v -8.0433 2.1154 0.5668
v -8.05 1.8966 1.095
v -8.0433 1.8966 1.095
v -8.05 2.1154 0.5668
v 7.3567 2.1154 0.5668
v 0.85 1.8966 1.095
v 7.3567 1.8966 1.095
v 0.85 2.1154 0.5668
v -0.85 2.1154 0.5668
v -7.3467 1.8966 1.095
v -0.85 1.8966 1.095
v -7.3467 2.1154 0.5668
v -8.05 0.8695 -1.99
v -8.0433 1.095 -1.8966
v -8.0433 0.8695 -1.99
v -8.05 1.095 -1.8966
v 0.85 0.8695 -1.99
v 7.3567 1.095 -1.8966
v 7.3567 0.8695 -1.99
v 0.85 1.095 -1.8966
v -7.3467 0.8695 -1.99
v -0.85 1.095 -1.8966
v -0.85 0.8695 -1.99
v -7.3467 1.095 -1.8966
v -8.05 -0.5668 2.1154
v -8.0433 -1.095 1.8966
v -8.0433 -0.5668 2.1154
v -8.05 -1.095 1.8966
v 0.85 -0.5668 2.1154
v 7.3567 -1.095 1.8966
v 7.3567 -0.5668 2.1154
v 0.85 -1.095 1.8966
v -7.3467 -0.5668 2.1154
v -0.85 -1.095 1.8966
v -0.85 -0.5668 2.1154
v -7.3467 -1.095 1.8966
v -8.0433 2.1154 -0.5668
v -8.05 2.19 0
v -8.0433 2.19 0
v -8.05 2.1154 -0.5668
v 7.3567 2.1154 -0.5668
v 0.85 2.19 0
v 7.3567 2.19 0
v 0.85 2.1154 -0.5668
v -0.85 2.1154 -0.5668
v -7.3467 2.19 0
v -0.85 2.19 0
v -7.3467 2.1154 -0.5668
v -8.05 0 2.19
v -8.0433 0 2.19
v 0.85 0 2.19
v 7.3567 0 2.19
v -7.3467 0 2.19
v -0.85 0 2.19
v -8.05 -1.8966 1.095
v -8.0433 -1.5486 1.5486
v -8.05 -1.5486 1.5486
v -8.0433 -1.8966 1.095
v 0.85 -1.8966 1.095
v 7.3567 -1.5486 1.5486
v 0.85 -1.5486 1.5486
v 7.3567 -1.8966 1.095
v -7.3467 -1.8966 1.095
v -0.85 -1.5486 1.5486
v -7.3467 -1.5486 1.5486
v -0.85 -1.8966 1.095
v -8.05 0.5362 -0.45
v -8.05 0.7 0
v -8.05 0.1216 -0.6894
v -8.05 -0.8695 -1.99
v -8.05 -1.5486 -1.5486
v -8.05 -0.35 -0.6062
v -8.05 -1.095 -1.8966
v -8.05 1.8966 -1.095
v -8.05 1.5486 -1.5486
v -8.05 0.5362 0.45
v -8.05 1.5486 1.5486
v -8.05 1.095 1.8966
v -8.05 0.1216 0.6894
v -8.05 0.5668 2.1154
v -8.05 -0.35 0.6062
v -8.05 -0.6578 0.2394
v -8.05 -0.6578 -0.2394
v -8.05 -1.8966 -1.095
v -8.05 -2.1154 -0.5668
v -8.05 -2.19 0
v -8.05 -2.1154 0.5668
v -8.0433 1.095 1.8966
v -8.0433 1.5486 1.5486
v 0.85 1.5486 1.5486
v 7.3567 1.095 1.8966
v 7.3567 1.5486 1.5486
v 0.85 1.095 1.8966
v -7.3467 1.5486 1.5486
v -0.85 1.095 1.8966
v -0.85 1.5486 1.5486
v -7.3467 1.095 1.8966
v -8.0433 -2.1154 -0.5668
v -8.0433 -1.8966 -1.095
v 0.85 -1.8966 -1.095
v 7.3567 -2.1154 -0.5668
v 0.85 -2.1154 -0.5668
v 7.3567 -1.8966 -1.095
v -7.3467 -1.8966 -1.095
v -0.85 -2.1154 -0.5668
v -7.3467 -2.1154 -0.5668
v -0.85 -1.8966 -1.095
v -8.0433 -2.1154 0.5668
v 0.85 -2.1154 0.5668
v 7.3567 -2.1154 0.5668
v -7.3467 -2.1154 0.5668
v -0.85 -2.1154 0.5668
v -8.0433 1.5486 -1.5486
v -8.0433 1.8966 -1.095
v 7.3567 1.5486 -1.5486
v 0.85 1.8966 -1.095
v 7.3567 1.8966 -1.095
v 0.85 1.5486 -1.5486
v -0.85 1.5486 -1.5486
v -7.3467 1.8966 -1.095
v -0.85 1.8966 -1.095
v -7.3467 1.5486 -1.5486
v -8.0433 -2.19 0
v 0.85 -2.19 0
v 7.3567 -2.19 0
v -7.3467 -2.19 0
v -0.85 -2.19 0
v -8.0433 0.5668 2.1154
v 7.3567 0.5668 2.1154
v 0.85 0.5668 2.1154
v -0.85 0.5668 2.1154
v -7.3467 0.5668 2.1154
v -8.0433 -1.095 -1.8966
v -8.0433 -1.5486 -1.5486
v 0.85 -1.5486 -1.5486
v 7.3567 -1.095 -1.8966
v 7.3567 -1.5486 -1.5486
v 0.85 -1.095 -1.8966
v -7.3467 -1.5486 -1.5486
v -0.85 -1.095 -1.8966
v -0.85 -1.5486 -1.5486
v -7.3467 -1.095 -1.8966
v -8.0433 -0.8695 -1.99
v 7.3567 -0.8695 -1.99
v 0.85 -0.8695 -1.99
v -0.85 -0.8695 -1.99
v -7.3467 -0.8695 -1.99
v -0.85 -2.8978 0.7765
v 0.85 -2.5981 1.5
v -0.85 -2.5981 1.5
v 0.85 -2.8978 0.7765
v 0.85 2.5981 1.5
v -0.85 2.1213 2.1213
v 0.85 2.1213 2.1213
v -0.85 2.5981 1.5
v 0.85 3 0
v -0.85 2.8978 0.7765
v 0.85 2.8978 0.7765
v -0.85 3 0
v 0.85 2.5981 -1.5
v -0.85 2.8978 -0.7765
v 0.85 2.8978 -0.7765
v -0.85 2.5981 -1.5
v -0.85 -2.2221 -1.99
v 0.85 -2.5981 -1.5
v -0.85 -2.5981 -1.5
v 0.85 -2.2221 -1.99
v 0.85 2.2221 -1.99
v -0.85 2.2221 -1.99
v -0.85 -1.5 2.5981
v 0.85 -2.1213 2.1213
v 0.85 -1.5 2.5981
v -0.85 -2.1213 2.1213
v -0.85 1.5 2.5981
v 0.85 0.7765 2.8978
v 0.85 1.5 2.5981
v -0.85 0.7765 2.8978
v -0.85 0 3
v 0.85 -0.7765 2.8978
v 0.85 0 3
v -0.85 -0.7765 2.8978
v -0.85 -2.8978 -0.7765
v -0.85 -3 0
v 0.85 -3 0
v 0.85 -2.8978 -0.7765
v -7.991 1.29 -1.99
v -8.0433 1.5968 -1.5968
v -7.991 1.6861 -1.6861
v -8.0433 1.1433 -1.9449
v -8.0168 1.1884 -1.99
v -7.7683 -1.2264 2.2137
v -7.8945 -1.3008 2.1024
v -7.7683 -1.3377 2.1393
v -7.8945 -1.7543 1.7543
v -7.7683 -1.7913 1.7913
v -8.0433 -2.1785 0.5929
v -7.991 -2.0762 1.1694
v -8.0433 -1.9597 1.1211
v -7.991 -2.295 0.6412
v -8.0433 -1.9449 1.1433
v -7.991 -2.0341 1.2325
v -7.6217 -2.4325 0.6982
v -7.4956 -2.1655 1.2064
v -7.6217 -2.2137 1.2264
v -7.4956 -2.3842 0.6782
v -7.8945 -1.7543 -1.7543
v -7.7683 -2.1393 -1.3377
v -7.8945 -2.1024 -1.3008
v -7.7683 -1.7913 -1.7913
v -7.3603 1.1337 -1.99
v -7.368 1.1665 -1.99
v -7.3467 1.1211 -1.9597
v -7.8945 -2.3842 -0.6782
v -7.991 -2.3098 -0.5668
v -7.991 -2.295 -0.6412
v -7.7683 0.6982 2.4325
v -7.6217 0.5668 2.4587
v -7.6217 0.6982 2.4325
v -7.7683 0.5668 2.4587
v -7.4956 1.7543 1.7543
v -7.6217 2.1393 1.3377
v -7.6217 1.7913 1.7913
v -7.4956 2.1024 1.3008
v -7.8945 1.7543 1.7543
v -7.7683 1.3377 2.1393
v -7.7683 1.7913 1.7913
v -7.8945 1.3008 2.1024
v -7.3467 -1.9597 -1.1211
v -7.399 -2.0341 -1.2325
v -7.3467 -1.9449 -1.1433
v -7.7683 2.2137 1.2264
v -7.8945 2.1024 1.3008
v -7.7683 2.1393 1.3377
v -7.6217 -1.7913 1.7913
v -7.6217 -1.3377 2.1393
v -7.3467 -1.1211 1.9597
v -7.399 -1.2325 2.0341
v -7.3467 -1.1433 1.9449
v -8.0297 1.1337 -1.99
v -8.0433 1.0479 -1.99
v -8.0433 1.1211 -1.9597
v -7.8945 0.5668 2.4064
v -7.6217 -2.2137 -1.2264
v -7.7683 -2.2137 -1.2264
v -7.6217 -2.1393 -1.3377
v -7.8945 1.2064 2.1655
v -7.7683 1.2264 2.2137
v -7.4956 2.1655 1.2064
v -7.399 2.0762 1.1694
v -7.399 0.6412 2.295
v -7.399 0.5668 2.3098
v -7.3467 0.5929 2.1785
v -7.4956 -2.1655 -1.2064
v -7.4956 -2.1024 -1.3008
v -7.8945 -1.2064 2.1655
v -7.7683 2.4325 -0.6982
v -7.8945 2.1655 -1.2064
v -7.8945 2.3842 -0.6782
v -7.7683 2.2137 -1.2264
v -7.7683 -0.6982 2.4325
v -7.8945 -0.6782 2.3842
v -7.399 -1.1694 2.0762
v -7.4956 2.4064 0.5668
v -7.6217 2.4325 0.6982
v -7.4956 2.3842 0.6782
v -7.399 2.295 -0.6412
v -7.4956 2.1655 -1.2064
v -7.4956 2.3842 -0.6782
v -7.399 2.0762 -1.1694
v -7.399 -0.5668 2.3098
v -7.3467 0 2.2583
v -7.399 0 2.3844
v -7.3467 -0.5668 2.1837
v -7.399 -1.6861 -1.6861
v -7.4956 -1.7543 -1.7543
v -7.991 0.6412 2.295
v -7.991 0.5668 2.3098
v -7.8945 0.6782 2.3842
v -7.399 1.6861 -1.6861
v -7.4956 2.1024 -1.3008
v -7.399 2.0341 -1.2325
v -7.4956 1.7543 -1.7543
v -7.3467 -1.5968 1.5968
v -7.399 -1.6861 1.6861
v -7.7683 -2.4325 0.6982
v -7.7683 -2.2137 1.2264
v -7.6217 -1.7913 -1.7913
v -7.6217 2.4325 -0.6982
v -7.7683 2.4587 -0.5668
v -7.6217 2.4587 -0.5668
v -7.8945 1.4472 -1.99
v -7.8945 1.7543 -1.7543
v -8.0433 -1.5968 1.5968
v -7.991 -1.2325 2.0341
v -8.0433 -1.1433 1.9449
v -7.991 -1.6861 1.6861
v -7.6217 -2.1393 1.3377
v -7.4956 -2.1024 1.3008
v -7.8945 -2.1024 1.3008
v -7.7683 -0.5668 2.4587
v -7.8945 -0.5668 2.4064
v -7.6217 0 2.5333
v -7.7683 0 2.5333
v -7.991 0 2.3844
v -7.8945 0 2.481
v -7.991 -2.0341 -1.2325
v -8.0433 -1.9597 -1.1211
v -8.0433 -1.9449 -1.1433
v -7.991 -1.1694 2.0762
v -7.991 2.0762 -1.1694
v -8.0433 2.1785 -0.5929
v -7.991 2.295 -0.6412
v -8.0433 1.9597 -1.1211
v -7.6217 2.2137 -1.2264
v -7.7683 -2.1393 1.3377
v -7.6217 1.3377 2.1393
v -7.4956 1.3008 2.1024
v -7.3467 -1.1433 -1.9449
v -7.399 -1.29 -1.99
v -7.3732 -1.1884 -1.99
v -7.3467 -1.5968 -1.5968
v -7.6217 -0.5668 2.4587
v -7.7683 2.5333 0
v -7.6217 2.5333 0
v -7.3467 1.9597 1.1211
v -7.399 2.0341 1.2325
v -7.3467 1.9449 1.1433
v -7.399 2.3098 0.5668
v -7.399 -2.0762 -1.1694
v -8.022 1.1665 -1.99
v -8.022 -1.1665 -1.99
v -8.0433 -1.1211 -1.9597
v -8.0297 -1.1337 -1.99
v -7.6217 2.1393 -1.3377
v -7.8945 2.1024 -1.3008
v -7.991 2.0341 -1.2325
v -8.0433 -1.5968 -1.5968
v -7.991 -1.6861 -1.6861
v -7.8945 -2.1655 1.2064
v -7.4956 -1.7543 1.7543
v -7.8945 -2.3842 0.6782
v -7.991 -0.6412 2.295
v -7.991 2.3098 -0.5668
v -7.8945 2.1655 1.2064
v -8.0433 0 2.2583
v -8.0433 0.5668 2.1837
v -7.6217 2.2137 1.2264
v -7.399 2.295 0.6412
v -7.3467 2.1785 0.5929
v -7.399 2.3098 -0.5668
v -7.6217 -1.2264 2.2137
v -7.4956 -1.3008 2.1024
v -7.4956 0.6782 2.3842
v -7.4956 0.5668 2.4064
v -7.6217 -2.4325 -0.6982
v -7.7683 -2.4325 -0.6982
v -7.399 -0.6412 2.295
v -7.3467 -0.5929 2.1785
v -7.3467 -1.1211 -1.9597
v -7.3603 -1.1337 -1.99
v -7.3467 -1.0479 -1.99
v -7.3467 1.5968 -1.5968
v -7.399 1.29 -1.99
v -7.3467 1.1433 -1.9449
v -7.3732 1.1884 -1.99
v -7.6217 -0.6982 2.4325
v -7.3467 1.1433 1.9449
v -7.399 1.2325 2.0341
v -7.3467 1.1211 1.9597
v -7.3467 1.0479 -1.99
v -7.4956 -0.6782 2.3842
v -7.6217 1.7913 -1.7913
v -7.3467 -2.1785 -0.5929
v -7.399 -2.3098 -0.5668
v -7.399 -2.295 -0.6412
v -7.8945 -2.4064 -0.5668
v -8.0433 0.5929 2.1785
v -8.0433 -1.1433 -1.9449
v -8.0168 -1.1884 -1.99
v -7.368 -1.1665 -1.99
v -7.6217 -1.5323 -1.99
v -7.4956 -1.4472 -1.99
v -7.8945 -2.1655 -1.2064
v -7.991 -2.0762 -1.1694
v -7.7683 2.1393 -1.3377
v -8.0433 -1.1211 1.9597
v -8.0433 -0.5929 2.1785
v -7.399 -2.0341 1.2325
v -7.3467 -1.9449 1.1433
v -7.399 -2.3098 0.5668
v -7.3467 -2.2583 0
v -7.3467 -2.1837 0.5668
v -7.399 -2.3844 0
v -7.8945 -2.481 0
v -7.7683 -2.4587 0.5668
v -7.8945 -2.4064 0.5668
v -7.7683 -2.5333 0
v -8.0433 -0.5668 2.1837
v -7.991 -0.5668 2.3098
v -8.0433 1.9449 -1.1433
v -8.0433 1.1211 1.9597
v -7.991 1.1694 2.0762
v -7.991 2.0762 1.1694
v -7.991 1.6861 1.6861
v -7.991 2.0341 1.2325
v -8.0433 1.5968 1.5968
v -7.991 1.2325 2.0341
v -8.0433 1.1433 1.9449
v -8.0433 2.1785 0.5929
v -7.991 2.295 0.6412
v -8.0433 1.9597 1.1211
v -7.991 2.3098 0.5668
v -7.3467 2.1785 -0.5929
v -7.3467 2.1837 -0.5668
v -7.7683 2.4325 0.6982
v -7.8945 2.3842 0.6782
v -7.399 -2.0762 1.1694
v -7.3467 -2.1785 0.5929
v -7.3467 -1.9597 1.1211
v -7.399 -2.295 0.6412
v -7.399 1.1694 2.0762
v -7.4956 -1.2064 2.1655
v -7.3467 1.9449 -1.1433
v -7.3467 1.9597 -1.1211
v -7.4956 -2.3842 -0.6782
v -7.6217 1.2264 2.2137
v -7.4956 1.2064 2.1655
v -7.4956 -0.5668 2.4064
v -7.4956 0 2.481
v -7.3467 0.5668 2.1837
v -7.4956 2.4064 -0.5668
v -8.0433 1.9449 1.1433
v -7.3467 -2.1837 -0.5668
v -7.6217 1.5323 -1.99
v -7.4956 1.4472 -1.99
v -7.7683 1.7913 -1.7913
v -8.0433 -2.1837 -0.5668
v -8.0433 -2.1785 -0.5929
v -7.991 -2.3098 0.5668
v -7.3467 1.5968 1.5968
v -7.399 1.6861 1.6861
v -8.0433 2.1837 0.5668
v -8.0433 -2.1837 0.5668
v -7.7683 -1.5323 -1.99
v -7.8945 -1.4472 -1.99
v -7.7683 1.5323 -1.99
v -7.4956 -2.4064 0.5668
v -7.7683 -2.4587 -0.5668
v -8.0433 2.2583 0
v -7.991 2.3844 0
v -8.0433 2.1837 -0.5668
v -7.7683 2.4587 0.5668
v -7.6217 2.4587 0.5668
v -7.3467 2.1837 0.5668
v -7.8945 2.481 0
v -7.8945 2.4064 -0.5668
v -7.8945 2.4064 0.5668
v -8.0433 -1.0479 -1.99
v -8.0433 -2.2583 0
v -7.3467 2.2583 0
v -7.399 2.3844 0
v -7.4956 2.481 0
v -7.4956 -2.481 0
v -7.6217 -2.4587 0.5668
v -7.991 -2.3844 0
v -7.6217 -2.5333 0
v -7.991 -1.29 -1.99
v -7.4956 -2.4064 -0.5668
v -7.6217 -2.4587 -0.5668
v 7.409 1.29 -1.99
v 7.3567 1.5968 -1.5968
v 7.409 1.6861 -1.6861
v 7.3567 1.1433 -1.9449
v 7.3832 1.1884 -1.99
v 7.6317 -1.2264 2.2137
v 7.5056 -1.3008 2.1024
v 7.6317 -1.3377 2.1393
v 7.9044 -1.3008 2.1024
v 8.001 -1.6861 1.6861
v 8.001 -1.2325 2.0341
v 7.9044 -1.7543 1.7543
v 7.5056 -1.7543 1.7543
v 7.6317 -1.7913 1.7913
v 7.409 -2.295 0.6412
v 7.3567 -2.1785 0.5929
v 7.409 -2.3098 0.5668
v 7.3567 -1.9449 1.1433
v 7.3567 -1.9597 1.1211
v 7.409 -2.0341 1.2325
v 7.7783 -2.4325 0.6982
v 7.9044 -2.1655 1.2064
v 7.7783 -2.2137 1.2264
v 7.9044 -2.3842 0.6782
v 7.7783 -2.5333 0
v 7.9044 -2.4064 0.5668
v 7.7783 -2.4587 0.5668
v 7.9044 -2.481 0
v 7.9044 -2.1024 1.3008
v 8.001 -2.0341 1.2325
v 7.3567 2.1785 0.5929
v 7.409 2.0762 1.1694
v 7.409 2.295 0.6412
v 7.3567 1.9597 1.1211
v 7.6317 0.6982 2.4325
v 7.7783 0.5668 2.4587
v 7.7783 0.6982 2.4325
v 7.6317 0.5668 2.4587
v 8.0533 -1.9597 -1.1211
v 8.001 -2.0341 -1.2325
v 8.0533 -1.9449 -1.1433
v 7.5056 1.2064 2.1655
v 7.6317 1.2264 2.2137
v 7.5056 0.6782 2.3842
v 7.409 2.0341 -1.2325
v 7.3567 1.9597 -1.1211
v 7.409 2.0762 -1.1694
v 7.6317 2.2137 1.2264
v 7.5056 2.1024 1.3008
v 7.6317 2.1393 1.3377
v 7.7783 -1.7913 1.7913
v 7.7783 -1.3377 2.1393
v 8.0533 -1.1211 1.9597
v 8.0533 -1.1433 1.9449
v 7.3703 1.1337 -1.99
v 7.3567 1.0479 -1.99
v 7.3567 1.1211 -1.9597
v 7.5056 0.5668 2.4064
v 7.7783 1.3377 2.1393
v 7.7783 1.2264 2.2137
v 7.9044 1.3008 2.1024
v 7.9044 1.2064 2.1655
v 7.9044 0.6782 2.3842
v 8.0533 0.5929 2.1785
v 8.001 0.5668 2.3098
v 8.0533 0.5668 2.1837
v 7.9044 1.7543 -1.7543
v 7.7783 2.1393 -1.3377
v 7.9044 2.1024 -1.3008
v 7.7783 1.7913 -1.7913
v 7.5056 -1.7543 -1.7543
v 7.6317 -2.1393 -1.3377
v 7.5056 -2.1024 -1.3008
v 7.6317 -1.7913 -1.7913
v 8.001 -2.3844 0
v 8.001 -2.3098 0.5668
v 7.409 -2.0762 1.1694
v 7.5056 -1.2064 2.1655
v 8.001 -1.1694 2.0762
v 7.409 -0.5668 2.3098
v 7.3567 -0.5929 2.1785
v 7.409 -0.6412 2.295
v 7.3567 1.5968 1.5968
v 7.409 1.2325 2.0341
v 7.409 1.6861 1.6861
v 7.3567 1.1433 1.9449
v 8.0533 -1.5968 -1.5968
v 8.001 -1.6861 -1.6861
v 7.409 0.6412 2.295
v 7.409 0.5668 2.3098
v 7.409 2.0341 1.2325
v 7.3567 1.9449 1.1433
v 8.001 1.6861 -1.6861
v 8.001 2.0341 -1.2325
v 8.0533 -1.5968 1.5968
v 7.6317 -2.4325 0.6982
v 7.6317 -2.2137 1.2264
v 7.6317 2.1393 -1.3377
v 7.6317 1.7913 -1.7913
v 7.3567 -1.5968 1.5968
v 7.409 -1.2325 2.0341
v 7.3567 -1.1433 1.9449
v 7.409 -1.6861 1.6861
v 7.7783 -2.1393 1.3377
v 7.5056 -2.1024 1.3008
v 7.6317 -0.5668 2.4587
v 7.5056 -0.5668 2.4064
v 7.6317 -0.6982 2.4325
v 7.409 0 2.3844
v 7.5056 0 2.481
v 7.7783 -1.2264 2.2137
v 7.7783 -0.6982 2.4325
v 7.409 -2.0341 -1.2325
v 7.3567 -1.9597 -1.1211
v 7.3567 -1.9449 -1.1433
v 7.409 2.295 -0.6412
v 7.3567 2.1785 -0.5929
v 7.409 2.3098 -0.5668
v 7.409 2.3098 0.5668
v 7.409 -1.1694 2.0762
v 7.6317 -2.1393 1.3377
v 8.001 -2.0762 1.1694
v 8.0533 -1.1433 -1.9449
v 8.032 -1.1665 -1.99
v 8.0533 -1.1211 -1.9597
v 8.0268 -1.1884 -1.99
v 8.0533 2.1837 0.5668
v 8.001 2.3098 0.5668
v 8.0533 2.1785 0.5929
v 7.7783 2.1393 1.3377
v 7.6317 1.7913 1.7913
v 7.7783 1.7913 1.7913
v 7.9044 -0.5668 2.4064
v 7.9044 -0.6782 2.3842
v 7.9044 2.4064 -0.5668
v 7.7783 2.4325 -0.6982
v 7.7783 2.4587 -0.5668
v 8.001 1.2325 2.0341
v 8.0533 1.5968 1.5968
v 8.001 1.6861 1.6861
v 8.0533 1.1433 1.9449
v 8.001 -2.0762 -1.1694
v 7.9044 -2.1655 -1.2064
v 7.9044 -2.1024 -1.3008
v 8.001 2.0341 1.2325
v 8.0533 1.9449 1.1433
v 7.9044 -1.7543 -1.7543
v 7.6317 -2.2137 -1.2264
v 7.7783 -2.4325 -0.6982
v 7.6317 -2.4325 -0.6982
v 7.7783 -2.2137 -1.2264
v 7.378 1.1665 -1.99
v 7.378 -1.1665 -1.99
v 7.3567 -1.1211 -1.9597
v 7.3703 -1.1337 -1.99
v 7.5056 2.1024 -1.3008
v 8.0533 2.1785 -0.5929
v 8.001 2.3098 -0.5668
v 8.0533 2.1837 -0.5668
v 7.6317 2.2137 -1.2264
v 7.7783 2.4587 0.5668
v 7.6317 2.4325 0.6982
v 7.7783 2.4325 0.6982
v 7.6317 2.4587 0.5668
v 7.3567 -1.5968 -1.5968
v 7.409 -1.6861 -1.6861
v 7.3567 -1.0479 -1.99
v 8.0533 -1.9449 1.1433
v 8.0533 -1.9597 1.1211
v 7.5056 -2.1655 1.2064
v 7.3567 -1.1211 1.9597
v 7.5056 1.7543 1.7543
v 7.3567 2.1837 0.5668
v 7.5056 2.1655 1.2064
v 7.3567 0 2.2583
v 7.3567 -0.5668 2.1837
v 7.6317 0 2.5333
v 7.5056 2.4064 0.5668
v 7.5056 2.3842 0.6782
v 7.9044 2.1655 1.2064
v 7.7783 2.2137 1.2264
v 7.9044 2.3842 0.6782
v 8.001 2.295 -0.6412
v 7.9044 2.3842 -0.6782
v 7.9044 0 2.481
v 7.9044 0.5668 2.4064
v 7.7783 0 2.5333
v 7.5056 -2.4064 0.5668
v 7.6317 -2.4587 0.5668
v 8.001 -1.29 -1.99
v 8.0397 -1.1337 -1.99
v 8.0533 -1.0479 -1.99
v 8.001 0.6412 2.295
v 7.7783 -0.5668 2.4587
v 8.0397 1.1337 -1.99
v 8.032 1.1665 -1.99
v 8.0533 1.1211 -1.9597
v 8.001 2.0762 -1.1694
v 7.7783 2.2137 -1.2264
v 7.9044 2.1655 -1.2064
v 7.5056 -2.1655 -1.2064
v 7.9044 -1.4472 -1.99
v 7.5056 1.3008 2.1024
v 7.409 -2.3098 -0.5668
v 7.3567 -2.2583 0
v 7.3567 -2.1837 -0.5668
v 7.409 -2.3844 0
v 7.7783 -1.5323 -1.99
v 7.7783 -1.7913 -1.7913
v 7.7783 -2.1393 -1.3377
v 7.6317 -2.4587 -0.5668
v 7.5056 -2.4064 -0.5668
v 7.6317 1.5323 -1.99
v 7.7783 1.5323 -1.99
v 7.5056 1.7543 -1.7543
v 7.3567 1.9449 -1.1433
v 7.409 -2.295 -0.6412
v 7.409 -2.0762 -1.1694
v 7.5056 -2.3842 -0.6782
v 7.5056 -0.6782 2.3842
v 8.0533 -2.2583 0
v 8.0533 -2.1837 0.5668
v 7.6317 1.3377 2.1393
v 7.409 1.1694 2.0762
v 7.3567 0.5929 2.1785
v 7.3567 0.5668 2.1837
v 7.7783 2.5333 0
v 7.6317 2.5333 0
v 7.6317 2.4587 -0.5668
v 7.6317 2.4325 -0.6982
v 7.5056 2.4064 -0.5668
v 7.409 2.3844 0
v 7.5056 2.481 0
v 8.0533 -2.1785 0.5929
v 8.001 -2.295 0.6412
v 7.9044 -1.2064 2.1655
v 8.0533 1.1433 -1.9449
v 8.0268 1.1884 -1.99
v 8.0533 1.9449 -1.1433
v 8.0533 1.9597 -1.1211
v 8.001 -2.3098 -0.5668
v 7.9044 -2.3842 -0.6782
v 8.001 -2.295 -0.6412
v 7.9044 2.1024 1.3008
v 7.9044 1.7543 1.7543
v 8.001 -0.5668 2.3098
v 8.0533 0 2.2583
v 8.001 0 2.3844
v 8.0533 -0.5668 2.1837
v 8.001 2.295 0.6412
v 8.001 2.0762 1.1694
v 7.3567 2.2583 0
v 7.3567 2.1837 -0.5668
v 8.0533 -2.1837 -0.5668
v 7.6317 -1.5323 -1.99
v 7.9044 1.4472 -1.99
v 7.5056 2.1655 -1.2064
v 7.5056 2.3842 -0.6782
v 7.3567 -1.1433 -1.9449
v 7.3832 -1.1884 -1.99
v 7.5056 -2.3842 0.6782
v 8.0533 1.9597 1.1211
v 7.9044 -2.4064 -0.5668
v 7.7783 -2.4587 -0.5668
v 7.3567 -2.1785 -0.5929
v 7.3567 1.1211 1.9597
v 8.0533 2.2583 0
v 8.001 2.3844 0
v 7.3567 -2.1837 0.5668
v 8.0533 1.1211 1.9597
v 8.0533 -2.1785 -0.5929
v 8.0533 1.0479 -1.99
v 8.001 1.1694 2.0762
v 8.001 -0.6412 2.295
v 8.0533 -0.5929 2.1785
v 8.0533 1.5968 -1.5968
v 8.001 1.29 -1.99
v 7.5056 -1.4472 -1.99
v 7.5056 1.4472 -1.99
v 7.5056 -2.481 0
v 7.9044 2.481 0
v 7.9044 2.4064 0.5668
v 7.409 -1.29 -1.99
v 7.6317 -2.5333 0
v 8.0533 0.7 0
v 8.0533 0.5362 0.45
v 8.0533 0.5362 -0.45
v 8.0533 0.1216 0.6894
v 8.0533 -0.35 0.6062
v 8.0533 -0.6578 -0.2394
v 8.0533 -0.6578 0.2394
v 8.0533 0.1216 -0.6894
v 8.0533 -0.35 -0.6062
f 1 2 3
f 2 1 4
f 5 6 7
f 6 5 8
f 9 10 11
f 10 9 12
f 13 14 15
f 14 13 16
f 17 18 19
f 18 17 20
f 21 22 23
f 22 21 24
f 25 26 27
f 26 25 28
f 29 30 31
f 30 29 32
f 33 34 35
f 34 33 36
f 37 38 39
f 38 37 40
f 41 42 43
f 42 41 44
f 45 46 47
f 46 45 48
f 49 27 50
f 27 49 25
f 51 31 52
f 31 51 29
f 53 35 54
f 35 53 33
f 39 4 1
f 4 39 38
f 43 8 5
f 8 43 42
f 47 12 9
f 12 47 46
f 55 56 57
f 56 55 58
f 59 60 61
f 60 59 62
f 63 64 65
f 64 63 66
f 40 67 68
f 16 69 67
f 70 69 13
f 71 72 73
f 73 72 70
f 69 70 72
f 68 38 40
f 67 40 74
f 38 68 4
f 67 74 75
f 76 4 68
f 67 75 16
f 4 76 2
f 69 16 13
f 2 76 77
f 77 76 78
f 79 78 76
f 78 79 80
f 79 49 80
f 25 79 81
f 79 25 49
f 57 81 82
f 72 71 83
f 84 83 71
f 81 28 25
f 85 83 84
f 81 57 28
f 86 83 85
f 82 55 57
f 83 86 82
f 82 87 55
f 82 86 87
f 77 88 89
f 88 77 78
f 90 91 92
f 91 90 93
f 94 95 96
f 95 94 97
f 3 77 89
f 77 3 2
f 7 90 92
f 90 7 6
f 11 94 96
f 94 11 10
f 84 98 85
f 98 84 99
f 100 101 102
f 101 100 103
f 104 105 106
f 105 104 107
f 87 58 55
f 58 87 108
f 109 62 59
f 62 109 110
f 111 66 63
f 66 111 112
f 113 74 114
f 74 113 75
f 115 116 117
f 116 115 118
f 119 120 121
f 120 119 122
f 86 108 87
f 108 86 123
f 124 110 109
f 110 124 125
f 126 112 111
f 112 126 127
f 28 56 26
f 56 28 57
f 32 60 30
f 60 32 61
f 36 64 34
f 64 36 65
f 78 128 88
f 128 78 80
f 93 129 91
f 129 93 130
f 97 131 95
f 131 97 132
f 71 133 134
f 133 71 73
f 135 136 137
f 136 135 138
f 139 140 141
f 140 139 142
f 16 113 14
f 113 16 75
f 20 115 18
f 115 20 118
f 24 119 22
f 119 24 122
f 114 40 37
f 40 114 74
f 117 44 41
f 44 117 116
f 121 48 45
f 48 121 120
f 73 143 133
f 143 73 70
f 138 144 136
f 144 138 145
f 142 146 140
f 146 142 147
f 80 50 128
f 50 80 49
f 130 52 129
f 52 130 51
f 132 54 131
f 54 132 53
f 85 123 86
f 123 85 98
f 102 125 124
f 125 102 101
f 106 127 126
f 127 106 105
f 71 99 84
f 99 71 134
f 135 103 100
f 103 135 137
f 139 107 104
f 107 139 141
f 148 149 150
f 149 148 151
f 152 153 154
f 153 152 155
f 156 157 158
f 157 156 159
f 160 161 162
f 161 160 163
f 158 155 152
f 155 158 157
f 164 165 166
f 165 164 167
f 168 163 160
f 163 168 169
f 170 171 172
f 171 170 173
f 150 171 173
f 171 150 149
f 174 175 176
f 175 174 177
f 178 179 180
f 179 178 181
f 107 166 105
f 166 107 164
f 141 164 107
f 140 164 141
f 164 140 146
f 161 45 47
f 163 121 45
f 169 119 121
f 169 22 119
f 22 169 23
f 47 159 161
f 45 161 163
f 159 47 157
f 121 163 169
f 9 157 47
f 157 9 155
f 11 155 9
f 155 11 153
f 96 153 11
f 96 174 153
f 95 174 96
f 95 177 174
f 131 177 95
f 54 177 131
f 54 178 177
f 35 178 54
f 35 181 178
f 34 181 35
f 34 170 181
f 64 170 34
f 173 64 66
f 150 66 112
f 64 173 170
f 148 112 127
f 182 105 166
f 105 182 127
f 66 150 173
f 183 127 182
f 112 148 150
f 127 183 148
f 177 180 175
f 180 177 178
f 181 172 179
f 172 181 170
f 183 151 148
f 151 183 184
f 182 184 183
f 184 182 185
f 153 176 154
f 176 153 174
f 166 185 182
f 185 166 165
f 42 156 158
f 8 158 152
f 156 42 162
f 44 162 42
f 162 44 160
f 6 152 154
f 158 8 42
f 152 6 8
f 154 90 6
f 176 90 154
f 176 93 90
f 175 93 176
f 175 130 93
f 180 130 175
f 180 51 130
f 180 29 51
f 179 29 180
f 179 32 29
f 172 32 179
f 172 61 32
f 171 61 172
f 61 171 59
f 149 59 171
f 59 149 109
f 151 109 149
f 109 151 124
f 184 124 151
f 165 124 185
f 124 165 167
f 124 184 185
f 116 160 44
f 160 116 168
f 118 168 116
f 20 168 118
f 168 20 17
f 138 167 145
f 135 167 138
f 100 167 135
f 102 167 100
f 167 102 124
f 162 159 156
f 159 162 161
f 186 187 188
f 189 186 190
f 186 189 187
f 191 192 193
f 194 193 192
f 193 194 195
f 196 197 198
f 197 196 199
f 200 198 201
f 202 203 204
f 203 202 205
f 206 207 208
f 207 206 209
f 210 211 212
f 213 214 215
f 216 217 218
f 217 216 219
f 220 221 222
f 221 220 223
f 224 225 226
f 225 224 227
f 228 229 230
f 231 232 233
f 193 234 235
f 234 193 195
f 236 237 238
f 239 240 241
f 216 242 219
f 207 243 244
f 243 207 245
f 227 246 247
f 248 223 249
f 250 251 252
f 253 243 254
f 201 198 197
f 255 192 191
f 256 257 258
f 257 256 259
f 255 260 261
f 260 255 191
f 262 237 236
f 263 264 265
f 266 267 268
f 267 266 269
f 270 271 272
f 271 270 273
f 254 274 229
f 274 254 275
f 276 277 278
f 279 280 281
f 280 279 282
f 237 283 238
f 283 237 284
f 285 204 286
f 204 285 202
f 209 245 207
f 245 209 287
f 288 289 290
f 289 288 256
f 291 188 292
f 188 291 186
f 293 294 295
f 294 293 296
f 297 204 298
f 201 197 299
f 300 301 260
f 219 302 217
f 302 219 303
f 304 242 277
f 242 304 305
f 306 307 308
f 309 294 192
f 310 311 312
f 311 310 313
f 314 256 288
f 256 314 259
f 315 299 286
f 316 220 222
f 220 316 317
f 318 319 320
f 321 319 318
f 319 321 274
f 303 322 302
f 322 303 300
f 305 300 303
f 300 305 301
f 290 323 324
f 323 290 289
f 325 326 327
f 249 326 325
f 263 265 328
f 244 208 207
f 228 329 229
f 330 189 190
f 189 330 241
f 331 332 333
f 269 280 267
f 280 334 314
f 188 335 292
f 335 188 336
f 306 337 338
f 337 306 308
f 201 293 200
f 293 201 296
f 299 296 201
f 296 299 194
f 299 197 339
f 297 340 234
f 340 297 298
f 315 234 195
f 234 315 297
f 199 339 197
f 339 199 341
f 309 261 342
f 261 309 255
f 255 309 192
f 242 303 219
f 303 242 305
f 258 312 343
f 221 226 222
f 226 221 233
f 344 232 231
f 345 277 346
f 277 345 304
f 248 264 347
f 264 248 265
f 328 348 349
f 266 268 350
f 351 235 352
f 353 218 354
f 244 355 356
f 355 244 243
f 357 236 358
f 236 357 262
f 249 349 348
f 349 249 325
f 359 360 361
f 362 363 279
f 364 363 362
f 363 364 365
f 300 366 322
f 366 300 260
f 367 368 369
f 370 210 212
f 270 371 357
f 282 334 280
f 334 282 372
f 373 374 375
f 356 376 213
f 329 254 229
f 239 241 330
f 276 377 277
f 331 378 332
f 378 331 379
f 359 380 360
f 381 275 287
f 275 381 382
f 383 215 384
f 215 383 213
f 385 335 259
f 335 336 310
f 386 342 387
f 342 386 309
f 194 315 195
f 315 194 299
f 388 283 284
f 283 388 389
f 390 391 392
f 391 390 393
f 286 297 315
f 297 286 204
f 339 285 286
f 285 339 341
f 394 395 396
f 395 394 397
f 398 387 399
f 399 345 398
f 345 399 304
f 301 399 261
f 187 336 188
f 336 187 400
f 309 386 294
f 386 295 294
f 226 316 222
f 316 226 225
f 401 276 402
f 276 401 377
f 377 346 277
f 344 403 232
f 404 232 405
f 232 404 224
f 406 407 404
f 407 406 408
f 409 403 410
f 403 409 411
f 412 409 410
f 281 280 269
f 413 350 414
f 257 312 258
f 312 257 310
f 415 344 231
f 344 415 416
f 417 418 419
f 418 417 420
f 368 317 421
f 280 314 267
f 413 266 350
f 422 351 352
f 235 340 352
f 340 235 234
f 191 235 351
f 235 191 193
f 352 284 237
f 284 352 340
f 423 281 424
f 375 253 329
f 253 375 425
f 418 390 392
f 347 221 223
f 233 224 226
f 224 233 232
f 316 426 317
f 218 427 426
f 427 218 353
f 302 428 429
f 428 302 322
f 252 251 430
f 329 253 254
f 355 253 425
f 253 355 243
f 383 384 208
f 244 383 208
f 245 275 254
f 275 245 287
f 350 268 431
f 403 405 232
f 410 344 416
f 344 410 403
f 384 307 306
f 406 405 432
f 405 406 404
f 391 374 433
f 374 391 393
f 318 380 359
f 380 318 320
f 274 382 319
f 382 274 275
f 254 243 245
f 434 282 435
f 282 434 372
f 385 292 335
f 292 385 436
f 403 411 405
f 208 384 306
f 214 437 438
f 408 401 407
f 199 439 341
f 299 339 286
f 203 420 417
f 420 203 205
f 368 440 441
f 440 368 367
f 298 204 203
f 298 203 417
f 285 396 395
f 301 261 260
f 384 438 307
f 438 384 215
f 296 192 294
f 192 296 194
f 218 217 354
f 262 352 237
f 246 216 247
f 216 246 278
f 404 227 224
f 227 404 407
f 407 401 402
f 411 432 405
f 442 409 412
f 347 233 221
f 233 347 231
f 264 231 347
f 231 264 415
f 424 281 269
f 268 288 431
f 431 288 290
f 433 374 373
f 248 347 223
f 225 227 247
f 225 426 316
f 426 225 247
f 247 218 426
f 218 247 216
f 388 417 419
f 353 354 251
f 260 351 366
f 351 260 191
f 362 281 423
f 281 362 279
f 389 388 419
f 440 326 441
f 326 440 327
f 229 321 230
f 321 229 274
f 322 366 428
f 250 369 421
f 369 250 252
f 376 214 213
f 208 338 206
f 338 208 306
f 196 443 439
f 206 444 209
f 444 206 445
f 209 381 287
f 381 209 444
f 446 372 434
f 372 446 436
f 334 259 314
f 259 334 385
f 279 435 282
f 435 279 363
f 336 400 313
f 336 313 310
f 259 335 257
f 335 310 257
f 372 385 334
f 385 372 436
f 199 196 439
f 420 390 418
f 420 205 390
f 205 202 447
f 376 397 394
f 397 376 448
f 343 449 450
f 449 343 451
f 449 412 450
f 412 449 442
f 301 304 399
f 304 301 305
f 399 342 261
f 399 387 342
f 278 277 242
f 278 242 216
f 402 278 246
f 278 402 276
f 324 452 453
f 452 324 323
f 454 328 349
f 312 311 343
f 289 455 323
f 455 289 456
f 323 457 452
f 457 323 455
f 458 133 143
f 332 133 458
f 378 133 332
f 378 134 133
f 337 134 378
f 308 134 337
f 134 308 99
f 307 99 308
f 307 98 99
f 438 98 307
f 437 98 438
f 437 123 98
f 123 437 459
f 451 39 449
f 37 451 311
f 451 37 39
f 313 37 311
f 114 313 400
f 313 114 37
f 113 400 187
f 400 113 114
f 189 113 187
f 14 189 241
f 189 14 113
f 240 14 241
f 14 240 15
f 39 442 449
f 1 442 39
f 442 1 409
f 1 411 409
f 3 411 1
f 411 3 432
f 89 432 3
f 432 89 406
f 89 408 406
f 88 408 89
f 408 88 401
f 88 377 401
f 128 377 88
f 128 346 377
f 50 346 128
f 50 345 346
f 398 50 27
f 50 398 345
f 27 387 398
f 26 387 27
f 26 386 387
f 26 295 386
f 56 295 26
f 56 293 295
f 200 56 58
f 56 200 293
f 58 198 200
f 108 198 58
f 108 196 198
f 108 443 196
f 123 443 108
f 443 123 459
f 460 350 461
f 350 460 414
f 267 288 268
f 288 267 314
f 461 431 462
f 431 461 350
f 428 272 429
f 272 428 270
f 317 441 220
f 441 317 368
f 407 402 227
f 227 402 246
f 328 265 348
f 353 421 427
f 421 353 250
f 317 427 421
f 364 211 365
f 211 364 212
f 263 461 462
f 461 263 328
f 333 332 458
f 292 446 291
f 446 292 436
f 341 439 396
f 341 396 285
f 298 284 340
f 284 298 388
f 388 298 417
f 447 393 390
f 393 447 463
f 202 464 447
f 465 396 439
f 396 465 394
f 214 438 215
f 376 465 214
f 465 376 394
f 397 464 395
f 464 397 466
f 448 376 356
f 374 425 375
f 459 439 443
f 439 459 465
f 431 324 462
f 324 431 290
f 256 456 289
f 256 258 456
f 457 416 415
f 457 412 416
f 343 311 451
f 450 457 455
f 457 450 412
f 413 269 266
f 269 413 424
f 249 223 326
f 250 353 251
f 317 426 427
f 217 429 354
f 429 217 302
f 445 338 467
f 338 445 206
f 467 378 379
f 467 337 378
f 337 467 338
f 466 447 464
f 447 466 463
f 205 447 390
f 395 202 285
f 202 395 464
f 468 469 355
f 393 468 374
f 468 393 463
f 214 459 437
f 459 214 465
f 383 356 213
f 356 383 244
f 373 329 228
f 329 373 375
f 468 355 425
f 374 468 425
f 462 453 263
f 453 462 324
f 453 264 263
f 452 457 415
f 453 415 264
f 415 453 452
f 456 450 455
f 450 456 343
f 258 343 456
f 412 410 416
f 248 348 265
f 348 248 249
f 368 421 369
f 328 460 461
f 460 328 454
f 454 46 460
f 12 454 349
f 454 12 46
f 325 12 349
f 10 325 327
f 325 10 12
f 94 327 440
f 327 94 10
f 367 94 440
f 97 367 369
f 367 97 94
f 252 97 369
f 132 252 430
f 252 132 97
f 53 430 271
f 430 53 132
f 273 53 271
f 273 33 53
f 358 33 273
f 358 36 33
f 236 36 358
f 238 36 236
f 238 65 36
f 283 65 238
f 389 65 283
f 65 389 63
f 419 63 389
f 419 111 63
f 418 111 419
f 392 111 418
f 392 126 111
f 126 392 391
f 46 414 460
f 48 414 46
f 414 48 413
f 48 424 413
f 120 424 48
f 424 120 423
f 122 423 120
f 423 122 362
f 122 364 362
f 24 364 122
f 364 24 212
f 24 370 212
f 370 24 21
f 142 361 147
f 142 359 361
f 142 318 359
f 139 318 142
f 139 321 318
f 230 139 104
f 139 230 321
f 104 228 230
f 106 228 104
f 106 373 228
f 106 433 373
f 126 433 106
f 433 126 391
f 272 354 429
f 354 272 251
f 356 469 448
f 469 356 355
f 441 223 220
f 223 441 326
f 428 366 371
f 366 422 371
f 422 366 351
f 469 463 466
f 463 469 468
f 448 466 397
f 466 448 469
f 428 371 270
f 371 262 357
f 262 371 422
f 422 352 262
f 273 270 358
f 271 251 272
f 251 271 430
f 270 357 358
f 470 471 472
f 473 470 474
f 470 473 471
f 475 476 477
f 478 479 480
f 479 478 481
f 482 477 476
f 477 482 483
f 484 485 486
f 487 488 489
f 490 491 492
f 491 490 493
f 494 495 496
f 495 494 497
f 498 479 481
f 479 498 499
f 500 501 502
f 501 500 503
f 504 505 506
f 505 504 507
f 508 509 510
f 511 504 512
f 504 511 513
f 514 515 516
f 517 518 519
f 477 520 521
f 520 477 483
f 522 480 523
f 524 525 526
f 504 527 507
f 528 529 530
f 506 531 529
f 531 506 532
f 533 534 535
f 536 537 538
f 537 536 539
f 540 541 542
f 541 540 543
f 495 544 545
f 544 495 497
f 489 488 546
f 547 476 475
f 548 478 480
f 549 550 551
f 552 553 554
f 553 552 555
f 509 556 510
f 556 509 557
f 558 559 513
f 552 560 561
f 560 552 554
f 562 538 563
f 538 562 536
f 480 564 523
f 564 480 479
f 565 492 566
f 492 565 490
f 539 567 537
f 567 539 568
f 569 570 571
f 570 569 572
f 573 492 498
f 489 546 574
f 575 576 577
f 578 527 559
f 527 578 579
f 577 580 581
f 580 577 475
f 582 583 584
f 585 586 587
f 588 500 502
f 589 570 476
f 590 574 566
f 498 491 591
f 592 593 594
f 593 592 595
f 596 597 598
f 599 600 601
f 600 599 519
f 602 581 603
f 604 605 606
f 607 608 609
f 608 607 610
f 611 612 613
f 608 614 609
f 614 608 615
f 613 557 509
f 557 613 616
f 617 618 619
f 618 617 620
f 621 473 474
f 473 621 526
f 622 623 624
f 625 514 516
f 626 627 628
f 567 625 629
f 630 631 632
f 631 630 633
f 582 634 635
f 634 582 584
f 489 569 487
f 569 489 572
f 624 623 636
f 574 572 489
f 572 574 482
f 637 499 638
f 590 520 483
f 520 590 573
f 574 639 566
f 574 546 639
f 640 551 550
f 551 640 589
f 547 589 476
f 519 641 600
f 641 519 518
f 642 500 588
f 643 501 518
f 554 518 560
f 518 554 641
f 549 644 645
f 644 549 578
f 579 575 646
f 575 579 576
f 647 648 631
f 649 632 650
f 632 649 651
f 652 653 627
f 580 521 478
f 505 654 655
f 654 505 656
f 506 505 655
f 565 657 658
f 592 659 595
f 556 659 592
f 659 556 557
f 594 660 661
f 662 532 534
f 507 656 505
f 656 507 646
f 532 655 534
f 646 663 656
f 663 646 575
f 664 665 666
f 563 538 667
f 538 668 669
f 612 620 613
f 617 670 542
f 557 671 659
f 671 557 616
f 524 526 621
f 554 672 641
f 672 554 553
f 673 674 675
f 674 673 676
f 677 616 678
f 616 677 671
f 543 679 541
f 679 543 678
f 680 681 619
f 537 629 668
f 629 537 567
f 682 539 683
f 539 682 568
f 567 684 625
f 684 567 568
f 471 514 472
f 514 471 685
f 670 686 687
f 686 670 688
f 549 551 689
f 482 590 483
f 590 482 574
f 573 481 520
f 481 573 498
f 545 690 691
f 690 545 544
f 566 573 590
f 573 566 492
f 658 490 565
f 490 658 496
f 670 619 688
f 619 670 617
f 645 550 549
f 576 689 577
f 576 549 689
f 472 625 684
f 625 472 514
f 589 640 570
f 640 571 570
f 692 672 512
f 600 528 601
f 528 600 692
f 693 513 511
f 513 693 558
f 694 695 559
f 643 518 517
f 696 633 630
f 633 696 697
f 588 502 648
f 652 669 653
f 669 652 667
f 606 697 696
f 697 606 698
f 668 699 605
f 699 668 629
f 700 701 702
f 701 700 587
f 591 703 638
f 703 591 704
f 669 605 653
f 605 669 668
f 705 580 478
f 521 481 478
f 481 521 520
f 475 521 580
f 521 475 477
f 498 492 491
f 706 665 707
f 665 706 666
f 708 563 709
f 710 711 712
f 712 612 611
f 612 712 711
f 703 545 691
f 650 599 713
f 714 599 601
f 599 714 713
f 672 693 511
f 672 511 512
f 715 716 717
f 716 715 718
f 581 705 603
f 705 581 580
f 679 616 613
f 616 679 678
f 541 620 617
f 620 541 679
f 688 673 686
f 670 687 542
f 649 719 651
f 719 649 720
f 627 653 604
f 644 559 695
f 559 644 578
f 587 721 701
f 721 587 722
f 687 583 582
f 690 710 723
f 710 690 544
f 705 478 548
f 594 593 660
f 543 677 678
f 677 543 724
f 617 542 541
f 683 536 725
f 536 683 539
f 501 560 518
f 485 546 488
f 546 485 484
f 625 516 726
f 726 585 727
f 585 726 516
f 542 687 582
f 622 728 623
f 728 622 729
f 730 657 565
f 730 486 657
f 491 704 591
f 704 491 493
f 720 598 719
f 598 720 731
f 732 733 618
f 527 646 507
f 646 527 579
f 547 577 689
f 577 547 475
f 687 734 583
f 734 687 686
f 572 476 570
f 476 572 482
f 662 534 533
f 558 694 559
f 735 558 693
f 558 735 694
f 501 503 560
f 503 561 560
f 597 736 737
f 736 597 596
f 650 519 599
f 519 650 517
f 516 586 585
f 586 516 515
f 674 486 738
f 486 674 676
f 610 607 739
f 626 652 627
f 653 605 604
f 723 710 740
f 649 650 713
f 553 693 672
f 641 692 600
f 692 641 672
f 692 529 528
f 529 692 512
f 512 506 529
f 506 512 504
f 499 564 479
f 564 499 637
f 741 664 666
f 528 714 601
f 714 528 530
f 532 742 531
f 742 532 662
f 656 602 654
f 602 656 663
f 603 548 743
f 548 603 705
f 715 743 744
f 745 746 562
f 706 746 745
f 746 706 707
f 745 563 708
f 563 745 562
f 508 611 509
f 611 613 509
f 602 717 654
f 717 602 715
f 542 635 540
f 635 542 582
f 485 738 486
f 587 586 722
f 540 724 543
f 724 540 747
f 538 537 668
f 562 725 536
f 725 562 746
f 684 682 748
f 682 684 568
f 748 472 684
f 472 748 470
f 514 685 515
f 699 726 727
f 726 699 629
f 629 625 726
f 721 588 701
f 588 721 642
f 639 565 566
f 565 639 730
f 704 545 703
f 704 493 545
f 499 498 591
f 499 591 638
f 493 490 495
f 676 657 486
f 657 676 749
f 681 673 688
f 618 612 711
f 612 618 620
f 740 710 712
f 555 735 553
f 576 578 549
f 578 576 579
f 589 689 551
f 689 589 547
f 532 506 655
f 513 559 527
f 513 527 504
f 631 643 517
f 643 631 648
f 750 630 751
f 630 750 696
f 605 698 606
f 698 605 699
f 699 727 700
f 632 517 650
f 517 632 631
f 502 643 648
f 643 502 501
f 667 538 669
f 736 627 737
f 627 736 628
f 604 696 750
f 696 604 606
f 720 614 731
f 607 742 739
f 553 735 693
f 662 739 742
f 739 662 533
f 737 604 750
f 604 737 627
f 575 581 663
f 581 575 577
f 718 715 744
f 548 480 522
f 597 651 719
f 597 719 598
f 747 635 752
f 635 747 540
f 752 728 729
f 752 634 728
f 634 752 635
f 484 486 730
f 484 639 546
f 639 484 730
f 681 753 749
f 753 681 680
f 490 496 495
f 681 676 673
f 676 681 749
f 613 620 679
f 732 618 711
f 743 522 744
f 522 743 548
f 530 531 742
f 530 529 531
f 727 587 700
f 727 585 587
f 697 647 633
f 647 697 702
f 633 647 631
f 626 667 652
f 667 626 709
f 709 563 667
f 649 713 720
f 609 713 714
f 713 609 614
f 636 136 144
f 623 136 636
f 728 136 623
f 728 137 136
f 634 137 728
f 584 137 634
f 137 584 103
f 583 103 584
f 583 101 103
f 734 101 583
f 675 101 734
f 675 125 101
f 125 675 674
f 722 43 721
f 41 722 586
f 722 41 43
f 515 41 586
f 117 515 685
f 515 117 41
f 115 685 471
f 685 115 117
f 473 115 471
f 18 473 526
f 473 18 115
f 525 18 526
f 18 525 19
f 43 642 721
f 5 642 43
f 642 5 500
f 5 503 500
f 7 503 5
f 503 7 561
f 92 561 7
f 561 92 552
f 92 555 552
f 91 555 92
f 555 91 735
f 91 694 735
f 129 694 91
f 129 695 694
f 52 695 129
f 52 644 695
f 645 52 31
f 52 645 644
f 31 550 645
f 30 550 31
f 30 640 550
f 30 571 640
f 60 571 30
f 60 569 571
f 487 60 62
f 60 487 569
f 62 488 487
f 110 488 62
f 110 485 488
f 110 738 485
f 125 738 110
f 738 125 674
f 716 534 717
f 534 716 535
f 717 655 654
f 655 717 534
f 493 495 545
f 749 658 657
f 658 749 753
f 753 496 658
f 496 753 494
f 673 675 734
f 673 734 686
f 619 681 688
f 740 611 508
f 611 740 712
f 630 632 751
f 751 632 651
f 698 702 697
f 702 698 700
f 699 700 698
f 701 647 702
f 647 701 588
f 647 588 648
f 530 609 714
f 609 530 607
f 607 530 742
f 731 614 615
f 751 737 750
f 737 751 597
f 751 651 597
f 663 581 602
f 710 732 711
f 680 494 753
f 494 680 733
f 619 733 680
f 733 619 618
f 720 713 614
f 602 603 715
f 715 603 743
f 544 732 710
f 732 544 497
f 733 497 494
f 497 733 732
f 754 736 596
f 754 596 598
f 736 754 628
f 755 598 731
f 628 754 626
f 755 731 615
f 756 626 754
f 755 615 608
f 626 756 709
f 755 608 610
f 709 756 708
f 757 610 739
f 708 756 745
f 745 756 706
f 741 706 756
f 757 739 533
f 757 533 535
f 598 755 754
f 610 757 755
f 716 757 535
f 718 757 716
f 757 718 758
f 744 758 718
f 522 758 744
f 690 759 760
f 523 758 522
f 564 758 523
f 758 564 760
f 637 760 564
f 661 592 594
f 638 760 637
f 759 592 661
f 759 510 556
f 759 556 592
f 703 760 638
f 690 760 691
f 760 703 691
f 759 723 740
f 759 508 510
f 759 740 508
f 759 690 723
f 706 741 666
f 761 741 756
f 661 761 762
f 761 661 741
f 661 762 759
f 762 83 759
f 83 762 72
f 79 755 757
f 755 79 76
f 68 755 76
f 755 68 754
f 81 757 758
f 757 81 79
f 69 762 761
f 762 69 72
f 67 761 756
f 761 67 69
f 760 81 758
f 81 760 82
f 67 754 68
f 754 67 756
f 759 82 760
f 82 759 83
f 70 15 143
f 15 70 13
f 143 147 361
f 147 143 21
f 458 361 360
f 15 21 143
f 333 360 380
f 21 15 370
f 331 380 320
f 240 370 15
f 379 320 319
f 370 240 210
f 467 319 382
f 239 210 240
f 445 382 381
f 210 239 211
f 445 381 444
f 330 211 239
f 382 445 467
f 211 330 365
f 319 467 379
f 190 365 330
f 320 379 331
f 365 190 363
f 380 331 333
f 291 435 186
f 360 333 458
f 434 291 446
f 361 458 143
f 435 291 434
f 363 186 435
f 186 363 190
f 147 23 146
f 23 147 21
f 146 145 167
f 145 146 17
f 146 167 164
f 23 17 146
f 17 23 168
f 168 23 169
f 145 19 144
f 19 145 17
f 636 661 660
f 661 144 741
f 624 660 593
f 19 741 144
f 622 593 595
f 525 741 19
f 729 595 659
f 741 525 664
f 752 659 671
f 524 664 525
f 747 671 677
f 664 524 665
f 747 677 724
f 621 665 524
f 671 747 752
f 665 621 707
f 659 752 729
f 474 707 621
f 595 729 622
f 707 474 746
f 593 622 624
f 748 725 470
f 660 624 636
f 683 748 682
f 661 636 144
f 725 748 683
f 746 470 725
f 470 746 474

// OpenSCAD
// file: PELA-simplified-technic-peg.scad
/*
PELA Parametric LEGO-compatible Technic Connector Peg

PELA Parametric Blocks - 3D Printed LEGO-compatible parametric blocks

Published at https://PELAblocks.org

By Paul Houghton
Twitter: @mobile_rat
Email: paulirotta@gmail.com
Blog: https://medium.com/@paulhoughton

Creative Commons Attribution-ShareAlike 4.0 International License
    https://creativecommons.org/licenses/by-sa/4.0/legalcode

Open source design, Powered By Futurice. Come work with the best.
    https://www.futurice.com/
*/

include <../style.scad>
include <../material.scad>
use <../PELA-block.scad>
use <PELA-technic-peg.scad>

/* [Technic Simplified Peg] */

// Show the inside structure [mm]
_cut_line = 0; // [0:1:100]

// Printing material (set to select calibrated knob, socket and axle hole fit)
_material = 0; // [0:PLA, 1:ABS, 2:PET, 3:Biofila Silk, 4:Pro1, 5:NGEN, 6:NGEN FLEX, 7:Bridge Nylon, 8:TPU95, 9:TPU85/NinjaFlex, 10:Polycarbonite]
// Is the printer nozzle >= 0.5mm? If so, some features are enlarged to make printing easier
_large_nozzle = true;

// An axle which fits loosely in a technic bearing hole
_axle_radius = 2.1; // [0.1:0.1:4]

// Size of the hollow inside a pin
_peg_center_radius=0.8; // [0.1:0.1:4]

// Size of the connector lock-in bump at the ends of a Pin
_peg_tip_length = 0.7; // [0.1:0.1:4]

// Width of the long vertical flexture slots in the side of a pin
_peg_slot_thickness = 0.0; // [0.1:0.1:4]


/* [Simplified Peg] */

// Size of the flat bottom cut to make the pin more easily printable
_bottom_flatness = 0.2; // [0.0:0.1:5]

// Size of the end angle cuts to ease tip flex
_end_cut_length = 6; // [0.0:0.1:10]





///////////////////////////////
// DISPLAY
///////////////////////////////

simplified_peg(material=_material, large_nozzle=_large_nozzle, cut_line=_cut_line, axle_radius=_axle_radius, peg_center_radius=_peg_center_radius, peg_length=_peg_length, peg_tip_length=_peg_tip_length, peg_slot_thickness=_peg_slot_thickness, bottom_flatness=_bottom_flatness, end_cut_length=_end_cut_length);



//////////////////
// Functions
//////////////////

module simplified_peg(material, large_nozzle, cut_line, axle_radius, peg_center_radius, peg_length, peg_tip_length, peg_slot_thickness, bottom_flatness, end_cut_length) {

    assert(material!=undef);
    assert(large_nozzle!=undef);
    assert(cut_line!=undef);
    assert(axle_radius!=undef);
    assert(peg_center_radius!=undef);
    assert(peg_length!=undef);
    assert(peg_tip_length!=undef);
    assert(peg_slot_thickness!=undef);
    assert(bottom_flatness!=undef);
    assert(end_cut_length!=undef);

    translate([0, 0, -axle_radius+bottom_flatness]) {
        intersection() {
            translate([0, 0, axle_radius - bottom_flatness]) {
                rotate([0, 90, 0]) {
                    peg(material=material, large_nozzle=large_nozzle, cut_line=cut_line, axle_radius=axle_radius, peg_center_radius=peg_center_radius, peg_length=peg_length, peg_tip_length=peg_tip_length, peg_slot_thickness=peg_slot_thickness);
                }
            }
            
            simplified_peg_cut(material=material, peg_length=peg_length, end_cut_length=end_cut_length, axle_radius=axle_radius);
        }
    }
}


module simplified_peg_cut(material, peg_length, end_cut_length, axle_radius) {
    difference() {
        union() {
            width = is_flexible(material) ? 100 : axle_radius;

            translate([-100, -width, 0]) {
                cube([200, 2*width, 100]);
            }

            translate([-peg_length/2, -100, 0]) {
                cube([peg_length, 200, 100]);
            }
        }

        echo(material);

        if (!is_flexible(material)) {
            union() {
                translate([-end_cut_length, -10, 0]) {
                    rotate([0, -135, 0]) {
                        cube([20, 20, 20]);
                    }
                }
                    
                translate([end_cut_length, -10, 0]) {
                    rotate([0, 45, 0]) {
                        cube([20, 20, 20]);
                    }
                }
            }
        }
    }
}
// file: ../style.scad
/*
PELA Parametric Block Style

Alter the baseline style of all designs. Many designs will locally override some but not all of these parameters.

Published at https://PELAblocks.org

By Paul Houghton
Twitter: @mobile_rat
Email: paulirotta@gmail.com
Blog: https://medium.com/@paulhoughton

Creative Commons Attribution-ShareAlike 4.0 International License
    https://creativecommons.org/licenses/by-sa/4.0/legalcode

Open source design, Powered By Futurice. Come work with the best.
    https://www.futurice.com/

Import this into other design files to set baseline constants:
    include <style.scad>

If the nozzle you normally use on your printer is 0.5mm or less, edit line 31 to read:
    31:     large_nozzle = false; // [true:nozzle >= 0.5mm, false:nozzle < 0.5mm]

There are many other parameters here which affect all generated PELA models. Any changes you make here affect all models unless that parameter is locally updated in a given model. Where models duplicate these settings, the local value will appear in the "Customizer" view of OpenSCAD. Think of those local overrides of these default style settings as a design decision: changing that parameter for that particular model is likely to be useful to you.

*/

include <material.scad>


/* [Block] */

// Presence of bottom connector sockets
_sockets = true;

// Presence of top connector knobs
_knobs = true;

// Place holes in the corners for mountings screws (0=>no holes, 1=>holes)
_corner_bolt_holes = false;

// Size of corner holes for M3 mountings bolts
_bolt_hole_radius = 1.6; // [0.0:0.1:3.0]

// Add interior fill for the base layer
_solid_first_layer = false;

// Add interior fill for upper layers
_solid_upper_layers = true;


/* [Knob] */

// Knob top surface strength
_knob_top_thickness = 1.0;

// Height of traditional connectors [mm] (taller gives a stronger hold)
_knob_height = 2.9; // [0:disabled, 1.8:traditional, 2.9:PELA 3D print tall]

// Size of a hole in the top of each knob. Set 0 to disable for best flexture or enable for air circulation/aesthetics/drain resin
_knob_vent_radius = 0.0; // [0.0:0.1:4]

// Ease insertion by slightly widening the socket entry
_bevel_socket = true;

// Height of a small bottom knob insert easement, flaring the bottom edges to make assembly easier
_socket_insert_bevel = 0.1;




/* [Technic] */

// Technic connector hole
//axle_hole_radius = 2.45 + axle_hole_tweak;

// Add full width through holes spaced along the length for techic connectors
_side_holes = 3; // [0:disabled, 1:short air vents, 2:short connectors, 3:full width connectors]

// Add a wrapper around side holes (disable for extra ventilation but loose lock notches)
_side_sheaths = true;

// Add short end holes spaced along the width for techic connectors
_end_holes = 2; // [0:disabled, 1:short air vents, 2:short connectors, 3:full length connectors]

// Add a wrapper around end holes (disable for extra ventilation but loose lock notches)
_end_sheaths = true;

// Add holes in the top deck to improve airflow and reduce weight
_top_vents = false;


/* [Shell] */

// Thickness of the solid top surface of the block
_top_shell = 1;


/* [Advanced Block] */

// Basic unit vertical size of each block
_block_height = 8; // [8:technic, 9.6:traditional knobs]

// Horizontal clearance space removed from the outer horizontal surface to allow two parts to be placed next to one another on a 8mm grid [mm]
_skin = 0.1; // [0:0.02:0.5]

// Height of the hole beneath each knob which facilitates click lock in low-flex materials by variable side pressure on any block above
_knob_flexture_height = 4.5;

// Width of horizontal surface strengthening slats between the bottom rings
_bottom_stiffener_width = 2.6;

// Height of horizontal surface strengthening slats (appears between the bottom rings, default is material.scad:knob_height)
_bottom_stiffener_height = _knob_height;


/* [Advanced Technic] */

// Technic connector hole inset radius
_counterbore_inset_radius = 3.1; // [0.1:0.1:4]

// Technic connector hole inset depth
_counterbore_inset_depth = 0.95; // [0.1:0.1:4]

// Contact length of axle to block (not including inset length and end snap fit flexture in peg connectors)
_peg_length = 6.5; // [0.1:0.1:16]

// Size of the cylinder wrapped around the technic holes
_bearing_sheath_thickness = 0.9; // [0.1:0.1:4]


/* [Block Aesthetics] */

// Width of a line etched in the side of multi-layer block sets (0 to disable)
_ridge_width = 0.15; // [0.1:0.05:4]

// Depth of a line etched in the side of multi-layer block sets
_ridge_depth = 0.3; // [0.1:0.05:4]


/* [Baked Print Supports] */

// Generate print-time support aid structures for models which offer this. Turn this off if you will use slicer-generated print supports, but be aware that these may make the bottom connectors difficult to post process.
_print_supports = true;

// Space between support/support.scad and the part)
_support_offset_from_part = 0.1; // [0.0:0.01:1]

// Thickness of each rotating layer in a twisting support [mm]
_support_layer_height = 2; // [0.1:0.1:8]

// Thickness of a base panel for holding supports together [mm]
_support_connection_height = 0.5; // [0.1:0.1:8]

// Length of sides of a support equilateral triangle [mm]
_support_side_length = 4; // [0.1:0.1:16]

// Per layer support rotation for strength [degrees]
_support_layer_rotation = 6; // [1:179]

// Reverse direction of support rotation periodically to constrain size [degrees] (0 to disable)
_support_max_rotation = 0; // [0:360]


/* [Hidden] */

// Basic unit horizontal size of each block
_block_width = 8; // [8:technic and traditional blocks]

// Height of the connectors commercial blocks use [mm]
_official_knob_height = 1.8; // [1.8:traditional blocks]

// Slight visual offset to work around prevent goldfeather rendering bugs in OpenSCAD (visual, not affecting final print geometry) [mm]
_defeather = 0.01;

// Roundness of bottom connector rings (Use 8 for octagonal sockets- many parts of the geomoetry must be adjusted if you change this)
_ring_fn=8;

// Roundness of bottom connector rings (Use 8 for octagonal sockets- many parts of the geomoetry must be adjusted if you change this)
_axle_hole_fn=32;

// Minimum angle to approximate a circle
$fa = 15;

// Minimum segment length to approximate a circle
$fs = 0.5;


/////////////////////////////////////
// FUNCTIONS
/////////////////////////////////////

// Horizontal size
function block_width(i=1) = i*_block_width;

// Vertical size [mm]
function block_height(h=1, block_height) = h*block_height;

// Test if this is a corner block
function is_corner(x, y, l, w) = (x==0 || x==l-1) && (y==0 || y==w-1);

// Ratio of a flat panel thickness to a regular block thickness (1/2 for PELA 8mm tall blocks, 1/3 for LEGO 9.6mm block_height blocks)
function panel_height_ratio(block_height) = block_height < 9.6 ? 1/2 : 1/3;

// Thickness of a flat panel [mm]
function panel_height(block_height) = block_height(1, block_height=_block_height)*panel_height_ratio(block_height=_block_height);

// Bottom connector additional distance from outside lock and connector rings which small flexture-fit rims protrude inwards to grab the base of knobs for asymmetric side pressure to assist with snap fit [mm]
function side_lock_thickness(material) = is_flexible(_material) ? 0.06 : 0.02;

// Horizontal width of each side of a support triangle [mm]
function support_line_width(large_nozzle) = large_nozzle ? 0.7 : 0.5;

// Force the cut visual line for seeing inside parts to be between 0 and 1mm short of the part width [mm]
function visual_cut(cut_line, w) = max(min(cut_line, block_width(w)), 0);

// Thickness of the solid outside surface of the block [mm]
function side_shell(large_nozzle) = large_nozzle ? 1.2 : 1.0;
// main file
/*
PELA Parametric LEGO-compatible Technic Connector Peg

PELA Parametric Blocks - 3D Printed LEGO-compatible parametric blocks

Published at https://PELAblocks.org

By Paul Houghton
Twitter: @mobile_rat
Email: paulirotta@gmail.com
Blog: https://medium.com/@paulhoughton

Creative Commons Attribution-ShareAlike 4.0 International License
    https://creativecommons.org/licenses/by-sa/4.0/legalcode

Open source design, Powered By Futurice. Come work with the best.
    https://www.futurice.com/
*/

include <../style.scad>
include <../material.scad>
use <../PELA-block.scad>
use <PELA-technic-peg.scad>
use <PELA-simplified-technic-peg.scad>


/* [Technic Simplified Peg] */

// Show the inside structure [mm]
_cut_line = 0; // [0:1:100]

// Printing material (set to select calibrated knob, socket and axle hole fit)
_material = 8; // [0:PLA, 1:ABS, 2:PET, 3:Biofila Silk, 4:Pro1, 5:NGEN, 6:NGEN FLEX, 7:Bridge Nylon, 8:TPU95, 9:TPU85/NinjaFlex, 10:Polycarbonite]

// Is the printer nozzle >= 0.5mm? If so, some features are enlarged to make printing easier
_large_nozzle = true;

// An axle which fits loosely in a technic bearing hole
_axle_radius = 2.19; // [0.1:0.1:4]

// Size of the hollow inside a pin
_peg_center_radius=0.7; // [0.1:0.1:4]

// Size of the connector lock-in bump at the ends of a Pin
_peg_tip_length = 0.7; // [0.1:0.1:4]

// Width of the long vertical flexture slots in the side of a pin
_peg_slot_thickness = 0.0; // [0.1:0.1:4]

// Size of the flat bottom cut to make the pin more easily printable
_bottom_flatness = 0.2; // [0.0:0.1:5]

// Size of the end angle cuts to ease tip flex
_end_cut_length = 6; // [0.0:0.1:10]





///////////////////////////////
// DISPLAY
///////////////////////////////

simplified_peg(material=_material, large_nozzle=_large_nozzle, cut_line=_cut_line, axle_radius=_axle_radius, peg_center_radius=_peg_center_radius, peg_length=_peg_length, peg_tip_length=_peg_tip_length, peg_slot_thickness=_peg_slot_thickness, bottom_flatness=_bottom_flatness, end_cut_length=_end_cut_length);
